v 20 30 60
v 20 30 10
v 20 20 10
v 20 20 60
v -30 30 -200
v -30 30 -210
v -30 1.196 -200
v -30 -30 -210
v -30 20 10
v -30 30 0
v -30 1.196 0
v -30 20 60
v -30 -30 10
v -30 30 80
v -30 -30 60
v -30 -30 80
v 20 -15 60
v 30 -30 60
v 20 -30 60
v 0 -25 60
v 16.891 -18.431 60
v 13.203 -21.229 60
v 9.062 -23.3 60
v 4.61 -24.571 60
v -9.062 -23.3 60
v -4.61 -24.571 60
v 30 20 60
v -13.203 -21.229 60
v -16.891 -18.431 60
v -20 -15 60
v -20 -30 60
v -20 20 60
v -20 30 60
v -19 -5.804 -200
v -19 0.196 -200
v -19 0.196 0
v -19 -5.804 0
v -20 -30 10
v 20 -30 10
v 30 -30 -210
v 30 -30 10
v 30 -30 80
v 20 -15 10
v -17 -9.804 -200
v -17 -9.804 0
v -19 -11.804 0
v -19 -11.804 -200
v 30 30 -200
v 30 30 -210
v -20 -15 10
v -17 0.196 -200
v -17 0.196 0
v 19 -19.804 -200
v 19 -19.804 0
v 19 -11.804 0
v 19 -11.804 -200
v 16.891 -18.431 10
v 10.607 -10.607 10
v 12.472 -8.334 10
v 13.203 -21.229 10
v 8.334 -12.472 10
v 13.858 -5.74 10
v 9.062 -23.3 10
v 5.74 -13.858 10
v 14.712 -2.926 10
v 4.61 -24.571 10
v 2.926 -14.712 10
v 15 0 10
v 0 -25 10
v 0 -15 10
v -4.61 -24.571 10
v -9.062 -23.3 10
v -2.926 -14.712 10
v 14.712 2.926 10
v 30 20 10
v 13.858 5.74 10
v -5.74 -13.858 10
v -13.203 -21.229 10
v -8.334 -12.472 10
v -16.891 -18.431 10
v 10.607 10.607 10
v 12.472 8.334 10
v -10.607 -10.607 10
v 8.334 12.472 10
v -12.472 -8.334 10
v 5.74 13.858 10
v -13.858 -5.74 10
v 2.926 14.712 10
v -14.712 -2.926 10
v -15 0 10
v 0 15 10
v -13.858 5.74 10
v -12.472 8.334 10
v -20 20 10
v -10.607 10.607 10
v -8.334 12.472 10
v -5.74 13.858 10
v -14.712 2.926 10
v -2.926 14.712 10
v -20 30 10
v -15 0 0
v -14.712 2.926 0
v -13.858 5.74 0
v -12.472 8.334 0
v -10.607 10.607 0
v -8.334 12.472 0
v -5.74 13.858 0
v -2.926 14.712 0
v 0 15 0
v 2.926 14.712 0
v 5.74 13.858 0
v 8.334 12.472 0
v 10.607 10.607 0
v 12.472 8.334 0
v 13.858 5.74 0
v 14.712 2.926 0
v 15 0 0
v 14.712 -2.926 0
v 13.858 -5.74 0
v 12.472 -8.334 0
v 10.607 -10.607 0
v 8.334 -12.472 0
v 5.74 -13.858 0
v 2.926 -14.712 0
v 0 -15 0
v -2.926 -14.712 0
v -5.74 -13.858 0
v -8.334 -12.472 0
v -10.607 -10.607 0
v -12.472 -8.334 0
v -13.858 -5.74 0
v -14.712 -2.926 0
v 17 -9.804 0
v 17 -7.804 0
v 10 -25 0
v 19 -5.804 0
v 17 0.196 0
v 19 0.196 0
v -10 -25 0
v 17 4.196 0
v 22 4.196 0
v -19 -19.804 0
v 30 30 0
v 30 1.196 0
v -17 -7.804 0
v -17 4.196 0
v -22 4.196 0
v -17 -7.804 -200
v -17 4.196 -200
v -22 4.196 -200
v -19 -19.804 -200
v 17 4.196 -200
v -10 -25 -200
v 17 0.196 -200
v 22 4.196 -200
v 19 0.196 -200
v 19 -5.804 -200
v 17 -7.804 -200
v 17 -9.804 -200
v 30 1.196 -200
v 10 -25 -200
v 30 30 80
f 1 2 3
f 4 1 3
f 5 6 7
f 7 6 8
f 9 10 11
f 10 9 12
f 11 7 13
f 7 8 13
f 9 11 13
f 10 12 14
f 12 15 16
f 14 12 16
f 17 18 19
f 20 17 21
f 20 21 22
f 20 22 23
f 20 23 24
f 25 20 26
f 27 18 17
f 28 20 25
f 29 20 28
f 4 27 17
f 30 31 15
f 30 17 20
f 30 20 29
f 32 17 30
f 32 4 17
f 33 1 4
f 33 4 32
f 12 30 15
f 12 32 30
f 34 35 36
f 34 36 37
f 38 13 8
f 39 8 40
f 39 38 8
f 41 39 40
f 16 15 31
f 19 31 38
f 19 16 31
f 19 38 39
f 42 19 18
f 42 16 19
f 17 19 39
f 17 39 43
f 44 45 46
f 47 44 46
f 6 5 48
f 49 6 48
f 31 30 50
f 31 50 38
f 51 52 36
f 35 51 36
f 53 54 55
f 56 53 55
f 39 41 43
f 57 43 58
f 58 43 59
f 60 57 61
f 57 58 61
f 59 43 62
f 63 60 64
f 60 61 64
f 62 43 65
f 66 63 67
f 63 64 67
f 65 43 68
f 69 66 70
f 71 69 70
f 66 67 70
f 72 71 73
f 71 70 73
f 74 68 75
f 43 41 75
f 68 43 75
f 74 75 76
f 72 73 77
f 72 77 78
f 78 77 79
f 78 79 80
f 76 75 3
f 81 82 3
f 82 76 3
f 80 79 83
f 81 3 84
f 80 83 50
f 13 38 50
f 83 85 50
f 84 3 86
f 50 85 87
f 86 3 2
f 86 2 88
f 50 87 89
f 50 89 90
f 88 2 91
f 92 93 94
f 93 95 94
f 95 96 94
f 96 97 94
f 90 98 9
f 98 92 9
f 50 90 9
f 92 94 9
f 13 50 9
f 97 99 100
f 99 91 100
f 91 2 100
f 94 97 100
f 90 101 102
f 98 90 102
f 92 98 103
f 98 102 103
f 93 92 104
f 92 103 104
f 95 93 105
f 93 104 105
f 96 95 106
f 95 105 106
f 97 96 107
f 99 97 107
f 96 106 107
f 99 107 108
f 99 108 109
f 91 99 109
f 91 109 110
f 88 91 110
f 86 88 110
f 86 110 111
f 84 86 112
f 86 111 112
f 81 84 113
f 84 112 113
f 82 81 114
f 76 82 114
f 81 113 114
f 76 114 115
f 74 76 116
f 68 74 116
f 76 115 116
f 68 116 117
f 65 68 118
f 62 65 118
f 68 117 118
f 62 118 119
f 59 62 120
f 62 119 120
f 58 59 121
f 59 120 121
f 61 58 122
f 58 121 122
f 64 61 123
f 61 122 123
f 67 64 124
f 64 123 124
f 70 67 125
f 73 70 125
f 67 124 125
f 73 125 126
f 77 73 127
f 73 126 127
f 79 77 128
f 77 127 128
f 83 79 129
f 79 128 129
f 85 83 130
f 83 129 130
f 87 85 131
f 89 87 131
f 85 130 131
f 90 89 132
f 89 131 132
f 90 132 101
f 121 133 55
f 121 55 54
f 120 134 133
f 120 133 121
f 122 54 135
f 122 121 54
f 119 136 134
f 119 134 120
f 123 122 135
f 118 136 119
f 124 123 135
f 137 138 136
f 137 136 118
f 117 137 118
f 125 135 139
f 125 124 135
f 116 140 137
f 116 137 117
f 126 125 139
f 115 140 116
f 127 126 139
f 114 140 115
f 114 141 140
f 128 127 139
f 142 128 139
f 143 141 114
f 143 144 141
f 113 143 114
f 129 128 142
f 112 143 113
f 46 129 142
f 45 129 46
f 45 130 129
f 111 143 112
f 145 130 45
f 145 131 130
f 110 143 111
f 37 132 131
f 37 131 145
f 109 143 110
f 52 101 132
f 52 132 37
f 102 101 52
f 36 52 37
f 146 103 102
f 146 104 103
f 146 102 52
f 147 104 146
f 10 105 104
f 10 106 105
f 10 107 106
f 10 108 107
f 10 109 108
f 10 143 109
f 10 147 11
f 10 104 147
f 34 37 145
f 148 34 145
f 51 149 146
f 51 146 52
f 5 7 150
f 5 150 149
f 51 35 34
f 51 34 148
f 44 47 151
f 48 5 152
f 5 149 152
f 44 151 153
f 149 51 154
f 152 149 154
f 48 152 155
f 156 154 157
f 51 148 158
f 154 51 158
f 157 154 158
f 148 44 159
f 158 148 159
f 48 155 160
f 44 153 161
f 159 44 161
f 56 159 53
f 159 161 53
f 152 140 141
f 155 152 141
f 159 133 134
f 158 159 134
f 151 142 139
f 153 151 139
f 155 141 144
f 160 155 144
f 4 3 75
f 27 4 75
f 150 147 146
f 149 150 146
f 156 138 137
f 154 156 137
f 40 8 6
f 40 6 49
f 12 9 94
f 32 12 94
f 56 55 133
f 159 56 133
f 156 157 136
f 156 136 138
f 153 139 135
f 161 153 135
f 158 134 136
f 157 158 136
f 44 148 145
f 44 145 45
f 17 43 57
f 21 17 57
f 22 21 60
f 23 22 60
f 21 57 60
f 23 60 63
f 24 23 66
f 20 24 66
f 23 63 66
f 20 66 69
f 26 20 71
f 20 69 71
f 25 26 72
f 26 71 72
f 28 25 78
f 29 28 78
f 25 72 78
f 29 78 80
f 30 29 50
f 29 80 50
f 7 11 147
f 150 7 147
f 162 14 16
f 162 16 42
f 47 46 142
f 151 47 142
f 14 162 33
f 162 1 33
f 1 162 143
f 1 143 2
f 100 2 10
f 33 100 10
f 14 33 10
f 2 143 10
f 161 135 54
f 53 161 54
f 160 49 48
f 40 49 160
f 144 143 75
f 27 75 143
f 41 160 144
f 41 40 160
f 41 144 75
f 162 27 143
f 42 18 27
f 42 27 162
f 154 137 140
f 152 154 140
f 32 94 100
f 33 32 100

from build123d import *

# Parameters (mm, degrees)
SKETCH1_W           = 60
SKETCH1_H           = 60
BOSS_EXTRUDE1_DEPTH = 80
CUT_EXTRUDE3_DEPTH  = 60
SKETCH6_W           = 60
SKETCH6_H           = 60
BOSS_EXTRUDE3_DEPTH = 10
SKETCH7_R           = 15
CUT_EXTRUDE4_DEPTH  = 10
BOSS_EXTRUDE4_DEPTH = 200
SKETCH10_W          = 60
SKETCH10_H          = 10
BOSS_EXTRUDE5_DEPTH = 60


with BuildPart() as part:
    # Sketch1 → Boss-Extrude1 (new body)
    with BuildSketch(Plane.XY):
        Rectangle(SKETCH1_W, SKETCH1_H)
    extrude(amount=BOSS_EXTRUDE1_DEPTH)

    # Sketch5 → Cut-Extrude3 (cut)
    with BuildSketch(Plane(origin=(0, 0, 0), x_dir=(-1, 0, 0), z_dir=(0, 0, -1))):
        with BuildLine():
            Line((20, 30), (-20, 30))
            Line((-20, 30), (-20, 20))
            Line((-20, 20), (-30, 20))
            Line((-30, 20), (-30, -30))
            Line((-30, -30), (-20, -30))
            Line((-20, -30), (-20, -15))
            ThreePointArc((-20, -15), (0, -25), (20, -15))
            Line((20, -15), (20, -30))
            Line((20, -30), (30, -30))
            Line((30, -30), (30, 20))
            Line((30, 20), (20, 20))
            Line((20, 20), (20, 30))
        make_face()
    extrude(amount=-CUT_EXTRUDE3_DEPTH, mode=Mode.SUBTRACT)

    # Sketch6 → Boss-Extrude3 (add)
    with BuildSketch(Plane(origin=(0, 0, 0), x_dir=(-1, 0, 0), z_dir=(0, 0, -1))):
        Rectangle(SKETCH6_W, SKETCH6_H)
    extrude(amount=-BOSS_EXTRUDE3_DEPTH)

    # Sketch7 → Cut-Extrude4 (cut)
    with BuildSketch(Plane(origin=(0, 0, 0), x_dir=(-1, 0, 0), z_dir=(0, 0, -1))):
        Circle(SKETCH7_R)
    extrude(amount=-CUT_EXTRUDE4_DEPTH, mode=Mode.SUBTRACT)

    # Sketch8 → Boss-Extrude4 (add)
    with BuildSketch(Plane(origin=(0, 0, 0), x_dir=(-1, 0, 0), z_dir=(0, 0, -1))):
        Polygon((-30, -25), (-10, -25), (-19, -19.803847577), (-19, -11.803847577), (-17, -9.803847577), (-17, -7.803847577), (-19, -5.803847577), (-19, 0.196152423), (-17, 0.196152423), (-17, 4.196152423), (-22, 4.196152423), (-30, 1.196152423), align=None)
        Polygon((19, -19.803847577), (10, -25), (30, -25), (30, 1.196152423), (22, 4.196152423), (17, 4.196152423), (17, 0.196152423), (19, 0.196152423), (19, -5.803847577), (17, -7.803847577), (17, -9.803847577), (19, -11.803847577), align=None)
        Polygon((10, -25), (0, -25), (0, -30), (30, -30), (30, -25), align=None)
        Polygon((0, -30), (0, -25), (-10, -25), (-30, -25), (-30, -30), align=None)
    extrude(amount=BOSS_EXTRUDE4_DEPTH)

    # Sketch10 → Boss-Extrude5 (add)
    with BuildSketch(Plane.XZ.offset(30)):
        with Locations((0, -205)):
            Rectangle(SKETCH10_W, SKETCH10_H)
    extrude(amount=-BOSS_EXTRUDE5_DEPTH)


solid = part.part
